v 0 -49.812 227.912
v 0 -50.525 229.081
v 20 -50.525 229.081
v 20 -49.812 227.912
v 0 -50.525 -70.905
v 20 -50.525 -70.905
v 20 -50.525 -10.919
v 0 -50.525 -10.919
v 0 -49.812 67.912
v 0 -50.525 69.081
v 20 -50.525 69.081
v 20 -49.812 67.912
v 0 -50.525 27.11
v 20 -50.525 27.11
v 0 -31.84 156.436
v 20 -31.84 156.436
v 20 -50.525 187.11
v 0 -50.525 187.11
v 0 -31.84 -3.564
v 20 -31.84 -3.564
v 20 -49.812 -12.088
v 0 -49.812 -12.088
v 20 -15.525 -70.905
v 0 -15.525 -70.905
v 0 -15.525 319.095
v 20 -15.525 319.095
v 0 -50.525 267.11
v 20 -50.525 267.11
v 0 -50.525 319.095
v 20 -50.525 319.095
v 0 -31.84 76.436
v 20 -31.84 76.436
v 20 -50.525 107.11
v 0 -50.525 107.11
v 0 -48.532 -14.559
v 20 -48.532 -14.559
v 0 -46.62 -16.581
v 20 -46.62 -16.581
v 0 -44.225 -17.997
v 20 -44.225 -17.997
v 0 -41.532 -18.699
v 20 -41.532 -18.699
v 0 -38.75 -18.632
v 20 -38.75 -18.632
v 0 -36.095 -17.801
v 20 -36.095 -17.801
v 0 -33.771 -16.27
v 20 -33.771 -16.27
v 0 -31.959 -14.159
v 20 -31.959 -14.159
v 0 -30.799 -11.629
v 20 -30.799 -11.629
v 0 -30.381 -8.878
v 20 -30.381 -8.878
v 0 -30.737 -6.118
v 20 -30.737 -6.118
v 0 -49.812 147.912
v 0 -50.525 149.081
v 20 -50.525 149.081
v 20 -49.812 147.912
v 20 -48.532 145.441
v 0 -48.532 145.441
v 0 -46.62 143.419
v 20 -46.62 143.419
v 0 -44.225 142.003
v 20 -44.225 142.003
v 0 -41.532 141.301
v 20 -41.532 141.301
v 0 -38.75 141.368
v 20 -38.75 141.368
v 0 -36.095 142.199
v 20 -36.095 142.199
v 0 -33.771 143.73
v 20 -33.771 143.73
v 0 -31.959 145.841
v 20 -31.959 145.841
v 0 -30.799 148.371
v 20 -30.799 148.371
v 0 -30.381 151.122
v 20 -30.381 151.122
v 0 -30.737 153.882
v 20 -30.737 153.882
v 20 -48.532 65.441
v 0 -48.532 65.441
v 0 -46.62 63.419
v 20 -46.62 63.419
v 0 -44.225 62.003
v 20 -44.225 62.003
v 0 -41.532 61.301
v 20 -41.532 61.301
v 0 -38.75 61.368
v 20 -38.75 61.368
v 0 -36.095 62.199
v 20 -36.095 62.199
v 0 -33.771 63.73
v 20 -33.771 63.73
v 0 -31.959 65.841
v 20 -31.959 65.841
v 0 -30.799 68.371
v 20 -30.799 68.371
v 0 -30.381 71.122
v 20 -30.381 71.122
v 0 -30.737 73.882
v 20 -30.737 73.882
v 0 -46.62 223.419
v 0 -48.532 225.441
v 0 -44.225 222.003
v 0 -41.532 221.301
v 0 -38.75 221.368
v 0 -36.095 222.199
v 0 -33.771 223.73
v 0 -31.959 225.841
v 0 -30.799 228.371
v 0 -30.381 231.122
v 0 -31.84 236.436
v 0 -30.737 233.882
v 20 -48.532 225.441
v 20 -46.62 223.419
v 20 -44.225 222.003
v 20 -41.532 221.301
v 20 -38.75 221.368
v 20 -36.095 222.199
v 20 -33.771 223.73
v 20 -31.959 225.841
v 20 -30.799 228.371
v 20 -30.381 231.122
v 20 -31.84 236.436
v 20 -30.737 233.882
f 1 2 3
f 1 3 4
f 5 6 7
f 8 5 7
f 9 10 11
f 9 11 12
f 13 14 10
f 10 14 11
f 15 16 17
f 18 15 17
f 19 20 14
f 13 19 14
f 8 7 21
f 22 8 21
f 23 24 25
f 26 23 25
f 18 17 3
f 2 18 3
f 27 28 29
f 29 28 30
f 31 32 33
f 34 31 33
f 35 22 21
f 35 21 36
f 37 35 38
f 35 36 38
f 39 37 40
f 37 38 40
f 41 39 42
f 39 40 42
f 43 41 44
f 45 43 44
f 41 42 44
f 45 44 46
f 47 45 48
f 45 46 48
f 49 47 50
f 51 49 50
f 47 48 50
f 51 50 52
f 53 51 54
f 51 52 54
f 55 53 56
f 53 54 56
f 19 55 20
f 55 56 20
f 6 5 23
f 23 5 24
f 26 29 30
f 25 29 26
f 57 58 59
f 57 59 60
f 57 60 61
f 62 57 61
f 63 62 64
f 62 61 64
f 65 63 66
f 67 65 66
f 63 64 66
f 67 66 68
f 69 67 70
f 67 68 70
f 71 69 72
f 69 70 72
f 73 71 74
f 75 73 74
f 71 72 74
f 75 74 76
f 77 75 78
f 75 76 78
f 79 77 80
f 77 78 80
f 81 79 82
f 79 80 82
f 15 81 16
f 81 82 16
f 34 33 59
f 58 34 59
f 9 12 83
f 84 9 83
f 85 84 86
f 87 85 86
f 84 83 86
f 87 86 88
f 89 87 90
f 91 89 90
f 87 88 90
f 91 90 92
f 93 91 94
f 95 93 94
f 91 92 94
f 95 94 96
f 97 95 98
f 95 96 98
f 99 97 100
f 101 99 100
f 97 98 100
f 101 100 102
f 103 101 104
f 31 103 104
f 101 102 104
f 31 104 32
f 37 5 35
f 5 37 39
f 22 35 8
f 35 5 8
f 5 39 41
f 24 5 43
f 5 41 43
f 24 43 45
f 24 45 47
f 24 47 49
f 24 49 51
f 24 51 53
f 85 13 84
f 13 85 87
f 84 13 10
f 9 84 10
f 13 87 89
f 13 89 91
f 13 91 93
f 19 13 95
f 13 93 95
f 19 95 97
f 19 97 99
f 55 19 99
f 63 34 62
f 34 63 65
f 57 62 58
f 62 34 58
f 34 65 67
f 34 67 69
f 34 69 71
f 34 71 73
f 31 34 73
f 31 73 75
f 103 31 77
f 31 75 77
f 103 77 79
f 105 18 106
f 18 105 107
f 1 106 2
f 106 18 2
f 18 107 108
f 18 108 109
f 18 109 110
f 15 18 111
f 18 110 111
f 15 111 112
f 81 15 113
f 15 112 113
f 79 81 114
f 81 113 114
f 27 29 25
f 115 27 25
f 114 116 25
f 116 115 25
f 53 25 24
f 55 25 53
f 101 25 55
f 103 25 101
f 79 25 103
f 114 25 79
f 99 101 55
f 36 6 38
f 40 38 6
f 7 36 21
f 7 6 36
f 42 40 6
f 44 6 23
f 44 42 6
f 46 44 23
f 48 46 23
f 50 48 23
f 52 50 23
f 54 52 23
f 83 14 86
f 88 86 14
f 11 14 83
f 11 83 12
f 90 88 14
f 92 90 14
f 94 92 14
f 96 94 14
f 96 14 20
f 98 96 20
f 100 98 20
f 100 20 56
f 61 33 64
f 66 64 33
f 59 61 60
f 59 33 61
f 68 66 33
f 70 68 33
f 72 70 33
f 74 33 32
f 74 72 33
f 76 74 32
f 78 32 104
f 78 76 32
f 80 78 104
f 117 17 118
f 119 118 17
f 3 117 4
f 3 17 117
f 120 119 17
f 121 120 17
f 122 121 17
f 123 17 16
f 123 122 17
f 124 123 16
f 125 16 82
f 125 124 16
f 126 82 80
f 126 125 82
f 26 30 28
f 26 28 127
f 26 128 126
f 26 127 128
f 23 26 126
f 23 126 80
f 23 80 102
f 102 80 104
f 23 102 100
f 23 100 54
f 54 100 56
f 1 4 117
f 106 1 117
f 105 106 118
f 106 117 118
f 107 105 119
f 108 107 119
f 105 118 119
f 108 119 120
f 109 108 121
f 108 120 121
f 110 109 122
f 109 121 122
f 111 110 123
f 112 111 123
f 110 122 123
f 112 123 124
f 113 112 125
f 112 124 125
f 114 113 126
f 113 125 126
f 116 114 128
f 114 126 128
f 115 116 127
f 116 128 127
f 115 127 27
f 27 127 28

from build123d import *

# Parameters (mm, degrees)
F0_W     = 50
F0_H     = 390
F1_DEPTH = 20
F3_DEPTH = 20.001
F4_W     = 15
F4_H     = 390
F5_DEPTH = 20.001


with BuildPart() as f1:
    # F0 (on Right) → F1 (new body)
    with BuildSketch(Plane.YZ):
        with Locations((-40.524636, 124.095061)):
            Rectangle(F0_W, F0_H)
    extrude(amount=F1_DEPTH)

    # F2 (on face) → F3 (cut, through all)
    with BuildSketch(Plane.YZ.offset(20)):
        with BuildLine():
            Line((-31.839951, -3.563652), (-65.524636, 51.735411))
            Line((-65.524636, 51.735411), (-65.524636, 13.706328))
            Line((-65.524636, 13.706328), (-49.812226, -12.088231))
            ThreePointArc((-49.812226, -12.088231), (-36.094721, -17.801029), (-31.839951, -3.563652))
        make_face()
        with BuildLine():
            Line((-31.839951, 76.436348), (-65.524636, 131.735411))
            Line((-65.524636, 131.735411), (-65.524636, 93.706328))
            Line((-65.524636, 93.706328), (-49.812226, 67.911769))
            ThreePointArc((-49.812226, 67.911769), (-36.094721, 62.198971), (-31.839951, 76.436348))
        make_face()
        with BuildLine():
            Line((-31.839951, 156.436348), (-65.524636, 211.735411))
            Line((-65.524636, 211.735411), (-65.524636, 173.706328))
            Line((-65.524636, 173.706328), (-49.812226, 147.911769))
            ThreePointArc((-49.812226, 147.911769), (-36.094721, 142.198971), (-31.839951, 156.436348))
        make_face()
        with BuildLine():
            Line((-31.839951, 236.436348), (-65.524636, 291.735411))
            Line((-65.524636, 291.735411), (-65.524636, 253.706328))
            Line((-65.524636, 253.706328), (-49.812226, 227.911769))
            ThreePointArc((-49.812226, 227.911769), (-36.094721, 222.198971), (-31.839951, 236.436348))
        make_face()
    extrude(amount=-F3_DEPTH, mode=Mode.SUBTRACT)

    # F4 (on face) → F5 (cut, through all)
    with BuildSketch(Plane.YZ.offset(20)):
        with Locations((-58.024636, 124.095061)):
            Rectangle(F4_W, F4_H)
    extrude(amount=-F5_DEPTH, mode=Mode.SUBTRACT)


solid = f1.part
